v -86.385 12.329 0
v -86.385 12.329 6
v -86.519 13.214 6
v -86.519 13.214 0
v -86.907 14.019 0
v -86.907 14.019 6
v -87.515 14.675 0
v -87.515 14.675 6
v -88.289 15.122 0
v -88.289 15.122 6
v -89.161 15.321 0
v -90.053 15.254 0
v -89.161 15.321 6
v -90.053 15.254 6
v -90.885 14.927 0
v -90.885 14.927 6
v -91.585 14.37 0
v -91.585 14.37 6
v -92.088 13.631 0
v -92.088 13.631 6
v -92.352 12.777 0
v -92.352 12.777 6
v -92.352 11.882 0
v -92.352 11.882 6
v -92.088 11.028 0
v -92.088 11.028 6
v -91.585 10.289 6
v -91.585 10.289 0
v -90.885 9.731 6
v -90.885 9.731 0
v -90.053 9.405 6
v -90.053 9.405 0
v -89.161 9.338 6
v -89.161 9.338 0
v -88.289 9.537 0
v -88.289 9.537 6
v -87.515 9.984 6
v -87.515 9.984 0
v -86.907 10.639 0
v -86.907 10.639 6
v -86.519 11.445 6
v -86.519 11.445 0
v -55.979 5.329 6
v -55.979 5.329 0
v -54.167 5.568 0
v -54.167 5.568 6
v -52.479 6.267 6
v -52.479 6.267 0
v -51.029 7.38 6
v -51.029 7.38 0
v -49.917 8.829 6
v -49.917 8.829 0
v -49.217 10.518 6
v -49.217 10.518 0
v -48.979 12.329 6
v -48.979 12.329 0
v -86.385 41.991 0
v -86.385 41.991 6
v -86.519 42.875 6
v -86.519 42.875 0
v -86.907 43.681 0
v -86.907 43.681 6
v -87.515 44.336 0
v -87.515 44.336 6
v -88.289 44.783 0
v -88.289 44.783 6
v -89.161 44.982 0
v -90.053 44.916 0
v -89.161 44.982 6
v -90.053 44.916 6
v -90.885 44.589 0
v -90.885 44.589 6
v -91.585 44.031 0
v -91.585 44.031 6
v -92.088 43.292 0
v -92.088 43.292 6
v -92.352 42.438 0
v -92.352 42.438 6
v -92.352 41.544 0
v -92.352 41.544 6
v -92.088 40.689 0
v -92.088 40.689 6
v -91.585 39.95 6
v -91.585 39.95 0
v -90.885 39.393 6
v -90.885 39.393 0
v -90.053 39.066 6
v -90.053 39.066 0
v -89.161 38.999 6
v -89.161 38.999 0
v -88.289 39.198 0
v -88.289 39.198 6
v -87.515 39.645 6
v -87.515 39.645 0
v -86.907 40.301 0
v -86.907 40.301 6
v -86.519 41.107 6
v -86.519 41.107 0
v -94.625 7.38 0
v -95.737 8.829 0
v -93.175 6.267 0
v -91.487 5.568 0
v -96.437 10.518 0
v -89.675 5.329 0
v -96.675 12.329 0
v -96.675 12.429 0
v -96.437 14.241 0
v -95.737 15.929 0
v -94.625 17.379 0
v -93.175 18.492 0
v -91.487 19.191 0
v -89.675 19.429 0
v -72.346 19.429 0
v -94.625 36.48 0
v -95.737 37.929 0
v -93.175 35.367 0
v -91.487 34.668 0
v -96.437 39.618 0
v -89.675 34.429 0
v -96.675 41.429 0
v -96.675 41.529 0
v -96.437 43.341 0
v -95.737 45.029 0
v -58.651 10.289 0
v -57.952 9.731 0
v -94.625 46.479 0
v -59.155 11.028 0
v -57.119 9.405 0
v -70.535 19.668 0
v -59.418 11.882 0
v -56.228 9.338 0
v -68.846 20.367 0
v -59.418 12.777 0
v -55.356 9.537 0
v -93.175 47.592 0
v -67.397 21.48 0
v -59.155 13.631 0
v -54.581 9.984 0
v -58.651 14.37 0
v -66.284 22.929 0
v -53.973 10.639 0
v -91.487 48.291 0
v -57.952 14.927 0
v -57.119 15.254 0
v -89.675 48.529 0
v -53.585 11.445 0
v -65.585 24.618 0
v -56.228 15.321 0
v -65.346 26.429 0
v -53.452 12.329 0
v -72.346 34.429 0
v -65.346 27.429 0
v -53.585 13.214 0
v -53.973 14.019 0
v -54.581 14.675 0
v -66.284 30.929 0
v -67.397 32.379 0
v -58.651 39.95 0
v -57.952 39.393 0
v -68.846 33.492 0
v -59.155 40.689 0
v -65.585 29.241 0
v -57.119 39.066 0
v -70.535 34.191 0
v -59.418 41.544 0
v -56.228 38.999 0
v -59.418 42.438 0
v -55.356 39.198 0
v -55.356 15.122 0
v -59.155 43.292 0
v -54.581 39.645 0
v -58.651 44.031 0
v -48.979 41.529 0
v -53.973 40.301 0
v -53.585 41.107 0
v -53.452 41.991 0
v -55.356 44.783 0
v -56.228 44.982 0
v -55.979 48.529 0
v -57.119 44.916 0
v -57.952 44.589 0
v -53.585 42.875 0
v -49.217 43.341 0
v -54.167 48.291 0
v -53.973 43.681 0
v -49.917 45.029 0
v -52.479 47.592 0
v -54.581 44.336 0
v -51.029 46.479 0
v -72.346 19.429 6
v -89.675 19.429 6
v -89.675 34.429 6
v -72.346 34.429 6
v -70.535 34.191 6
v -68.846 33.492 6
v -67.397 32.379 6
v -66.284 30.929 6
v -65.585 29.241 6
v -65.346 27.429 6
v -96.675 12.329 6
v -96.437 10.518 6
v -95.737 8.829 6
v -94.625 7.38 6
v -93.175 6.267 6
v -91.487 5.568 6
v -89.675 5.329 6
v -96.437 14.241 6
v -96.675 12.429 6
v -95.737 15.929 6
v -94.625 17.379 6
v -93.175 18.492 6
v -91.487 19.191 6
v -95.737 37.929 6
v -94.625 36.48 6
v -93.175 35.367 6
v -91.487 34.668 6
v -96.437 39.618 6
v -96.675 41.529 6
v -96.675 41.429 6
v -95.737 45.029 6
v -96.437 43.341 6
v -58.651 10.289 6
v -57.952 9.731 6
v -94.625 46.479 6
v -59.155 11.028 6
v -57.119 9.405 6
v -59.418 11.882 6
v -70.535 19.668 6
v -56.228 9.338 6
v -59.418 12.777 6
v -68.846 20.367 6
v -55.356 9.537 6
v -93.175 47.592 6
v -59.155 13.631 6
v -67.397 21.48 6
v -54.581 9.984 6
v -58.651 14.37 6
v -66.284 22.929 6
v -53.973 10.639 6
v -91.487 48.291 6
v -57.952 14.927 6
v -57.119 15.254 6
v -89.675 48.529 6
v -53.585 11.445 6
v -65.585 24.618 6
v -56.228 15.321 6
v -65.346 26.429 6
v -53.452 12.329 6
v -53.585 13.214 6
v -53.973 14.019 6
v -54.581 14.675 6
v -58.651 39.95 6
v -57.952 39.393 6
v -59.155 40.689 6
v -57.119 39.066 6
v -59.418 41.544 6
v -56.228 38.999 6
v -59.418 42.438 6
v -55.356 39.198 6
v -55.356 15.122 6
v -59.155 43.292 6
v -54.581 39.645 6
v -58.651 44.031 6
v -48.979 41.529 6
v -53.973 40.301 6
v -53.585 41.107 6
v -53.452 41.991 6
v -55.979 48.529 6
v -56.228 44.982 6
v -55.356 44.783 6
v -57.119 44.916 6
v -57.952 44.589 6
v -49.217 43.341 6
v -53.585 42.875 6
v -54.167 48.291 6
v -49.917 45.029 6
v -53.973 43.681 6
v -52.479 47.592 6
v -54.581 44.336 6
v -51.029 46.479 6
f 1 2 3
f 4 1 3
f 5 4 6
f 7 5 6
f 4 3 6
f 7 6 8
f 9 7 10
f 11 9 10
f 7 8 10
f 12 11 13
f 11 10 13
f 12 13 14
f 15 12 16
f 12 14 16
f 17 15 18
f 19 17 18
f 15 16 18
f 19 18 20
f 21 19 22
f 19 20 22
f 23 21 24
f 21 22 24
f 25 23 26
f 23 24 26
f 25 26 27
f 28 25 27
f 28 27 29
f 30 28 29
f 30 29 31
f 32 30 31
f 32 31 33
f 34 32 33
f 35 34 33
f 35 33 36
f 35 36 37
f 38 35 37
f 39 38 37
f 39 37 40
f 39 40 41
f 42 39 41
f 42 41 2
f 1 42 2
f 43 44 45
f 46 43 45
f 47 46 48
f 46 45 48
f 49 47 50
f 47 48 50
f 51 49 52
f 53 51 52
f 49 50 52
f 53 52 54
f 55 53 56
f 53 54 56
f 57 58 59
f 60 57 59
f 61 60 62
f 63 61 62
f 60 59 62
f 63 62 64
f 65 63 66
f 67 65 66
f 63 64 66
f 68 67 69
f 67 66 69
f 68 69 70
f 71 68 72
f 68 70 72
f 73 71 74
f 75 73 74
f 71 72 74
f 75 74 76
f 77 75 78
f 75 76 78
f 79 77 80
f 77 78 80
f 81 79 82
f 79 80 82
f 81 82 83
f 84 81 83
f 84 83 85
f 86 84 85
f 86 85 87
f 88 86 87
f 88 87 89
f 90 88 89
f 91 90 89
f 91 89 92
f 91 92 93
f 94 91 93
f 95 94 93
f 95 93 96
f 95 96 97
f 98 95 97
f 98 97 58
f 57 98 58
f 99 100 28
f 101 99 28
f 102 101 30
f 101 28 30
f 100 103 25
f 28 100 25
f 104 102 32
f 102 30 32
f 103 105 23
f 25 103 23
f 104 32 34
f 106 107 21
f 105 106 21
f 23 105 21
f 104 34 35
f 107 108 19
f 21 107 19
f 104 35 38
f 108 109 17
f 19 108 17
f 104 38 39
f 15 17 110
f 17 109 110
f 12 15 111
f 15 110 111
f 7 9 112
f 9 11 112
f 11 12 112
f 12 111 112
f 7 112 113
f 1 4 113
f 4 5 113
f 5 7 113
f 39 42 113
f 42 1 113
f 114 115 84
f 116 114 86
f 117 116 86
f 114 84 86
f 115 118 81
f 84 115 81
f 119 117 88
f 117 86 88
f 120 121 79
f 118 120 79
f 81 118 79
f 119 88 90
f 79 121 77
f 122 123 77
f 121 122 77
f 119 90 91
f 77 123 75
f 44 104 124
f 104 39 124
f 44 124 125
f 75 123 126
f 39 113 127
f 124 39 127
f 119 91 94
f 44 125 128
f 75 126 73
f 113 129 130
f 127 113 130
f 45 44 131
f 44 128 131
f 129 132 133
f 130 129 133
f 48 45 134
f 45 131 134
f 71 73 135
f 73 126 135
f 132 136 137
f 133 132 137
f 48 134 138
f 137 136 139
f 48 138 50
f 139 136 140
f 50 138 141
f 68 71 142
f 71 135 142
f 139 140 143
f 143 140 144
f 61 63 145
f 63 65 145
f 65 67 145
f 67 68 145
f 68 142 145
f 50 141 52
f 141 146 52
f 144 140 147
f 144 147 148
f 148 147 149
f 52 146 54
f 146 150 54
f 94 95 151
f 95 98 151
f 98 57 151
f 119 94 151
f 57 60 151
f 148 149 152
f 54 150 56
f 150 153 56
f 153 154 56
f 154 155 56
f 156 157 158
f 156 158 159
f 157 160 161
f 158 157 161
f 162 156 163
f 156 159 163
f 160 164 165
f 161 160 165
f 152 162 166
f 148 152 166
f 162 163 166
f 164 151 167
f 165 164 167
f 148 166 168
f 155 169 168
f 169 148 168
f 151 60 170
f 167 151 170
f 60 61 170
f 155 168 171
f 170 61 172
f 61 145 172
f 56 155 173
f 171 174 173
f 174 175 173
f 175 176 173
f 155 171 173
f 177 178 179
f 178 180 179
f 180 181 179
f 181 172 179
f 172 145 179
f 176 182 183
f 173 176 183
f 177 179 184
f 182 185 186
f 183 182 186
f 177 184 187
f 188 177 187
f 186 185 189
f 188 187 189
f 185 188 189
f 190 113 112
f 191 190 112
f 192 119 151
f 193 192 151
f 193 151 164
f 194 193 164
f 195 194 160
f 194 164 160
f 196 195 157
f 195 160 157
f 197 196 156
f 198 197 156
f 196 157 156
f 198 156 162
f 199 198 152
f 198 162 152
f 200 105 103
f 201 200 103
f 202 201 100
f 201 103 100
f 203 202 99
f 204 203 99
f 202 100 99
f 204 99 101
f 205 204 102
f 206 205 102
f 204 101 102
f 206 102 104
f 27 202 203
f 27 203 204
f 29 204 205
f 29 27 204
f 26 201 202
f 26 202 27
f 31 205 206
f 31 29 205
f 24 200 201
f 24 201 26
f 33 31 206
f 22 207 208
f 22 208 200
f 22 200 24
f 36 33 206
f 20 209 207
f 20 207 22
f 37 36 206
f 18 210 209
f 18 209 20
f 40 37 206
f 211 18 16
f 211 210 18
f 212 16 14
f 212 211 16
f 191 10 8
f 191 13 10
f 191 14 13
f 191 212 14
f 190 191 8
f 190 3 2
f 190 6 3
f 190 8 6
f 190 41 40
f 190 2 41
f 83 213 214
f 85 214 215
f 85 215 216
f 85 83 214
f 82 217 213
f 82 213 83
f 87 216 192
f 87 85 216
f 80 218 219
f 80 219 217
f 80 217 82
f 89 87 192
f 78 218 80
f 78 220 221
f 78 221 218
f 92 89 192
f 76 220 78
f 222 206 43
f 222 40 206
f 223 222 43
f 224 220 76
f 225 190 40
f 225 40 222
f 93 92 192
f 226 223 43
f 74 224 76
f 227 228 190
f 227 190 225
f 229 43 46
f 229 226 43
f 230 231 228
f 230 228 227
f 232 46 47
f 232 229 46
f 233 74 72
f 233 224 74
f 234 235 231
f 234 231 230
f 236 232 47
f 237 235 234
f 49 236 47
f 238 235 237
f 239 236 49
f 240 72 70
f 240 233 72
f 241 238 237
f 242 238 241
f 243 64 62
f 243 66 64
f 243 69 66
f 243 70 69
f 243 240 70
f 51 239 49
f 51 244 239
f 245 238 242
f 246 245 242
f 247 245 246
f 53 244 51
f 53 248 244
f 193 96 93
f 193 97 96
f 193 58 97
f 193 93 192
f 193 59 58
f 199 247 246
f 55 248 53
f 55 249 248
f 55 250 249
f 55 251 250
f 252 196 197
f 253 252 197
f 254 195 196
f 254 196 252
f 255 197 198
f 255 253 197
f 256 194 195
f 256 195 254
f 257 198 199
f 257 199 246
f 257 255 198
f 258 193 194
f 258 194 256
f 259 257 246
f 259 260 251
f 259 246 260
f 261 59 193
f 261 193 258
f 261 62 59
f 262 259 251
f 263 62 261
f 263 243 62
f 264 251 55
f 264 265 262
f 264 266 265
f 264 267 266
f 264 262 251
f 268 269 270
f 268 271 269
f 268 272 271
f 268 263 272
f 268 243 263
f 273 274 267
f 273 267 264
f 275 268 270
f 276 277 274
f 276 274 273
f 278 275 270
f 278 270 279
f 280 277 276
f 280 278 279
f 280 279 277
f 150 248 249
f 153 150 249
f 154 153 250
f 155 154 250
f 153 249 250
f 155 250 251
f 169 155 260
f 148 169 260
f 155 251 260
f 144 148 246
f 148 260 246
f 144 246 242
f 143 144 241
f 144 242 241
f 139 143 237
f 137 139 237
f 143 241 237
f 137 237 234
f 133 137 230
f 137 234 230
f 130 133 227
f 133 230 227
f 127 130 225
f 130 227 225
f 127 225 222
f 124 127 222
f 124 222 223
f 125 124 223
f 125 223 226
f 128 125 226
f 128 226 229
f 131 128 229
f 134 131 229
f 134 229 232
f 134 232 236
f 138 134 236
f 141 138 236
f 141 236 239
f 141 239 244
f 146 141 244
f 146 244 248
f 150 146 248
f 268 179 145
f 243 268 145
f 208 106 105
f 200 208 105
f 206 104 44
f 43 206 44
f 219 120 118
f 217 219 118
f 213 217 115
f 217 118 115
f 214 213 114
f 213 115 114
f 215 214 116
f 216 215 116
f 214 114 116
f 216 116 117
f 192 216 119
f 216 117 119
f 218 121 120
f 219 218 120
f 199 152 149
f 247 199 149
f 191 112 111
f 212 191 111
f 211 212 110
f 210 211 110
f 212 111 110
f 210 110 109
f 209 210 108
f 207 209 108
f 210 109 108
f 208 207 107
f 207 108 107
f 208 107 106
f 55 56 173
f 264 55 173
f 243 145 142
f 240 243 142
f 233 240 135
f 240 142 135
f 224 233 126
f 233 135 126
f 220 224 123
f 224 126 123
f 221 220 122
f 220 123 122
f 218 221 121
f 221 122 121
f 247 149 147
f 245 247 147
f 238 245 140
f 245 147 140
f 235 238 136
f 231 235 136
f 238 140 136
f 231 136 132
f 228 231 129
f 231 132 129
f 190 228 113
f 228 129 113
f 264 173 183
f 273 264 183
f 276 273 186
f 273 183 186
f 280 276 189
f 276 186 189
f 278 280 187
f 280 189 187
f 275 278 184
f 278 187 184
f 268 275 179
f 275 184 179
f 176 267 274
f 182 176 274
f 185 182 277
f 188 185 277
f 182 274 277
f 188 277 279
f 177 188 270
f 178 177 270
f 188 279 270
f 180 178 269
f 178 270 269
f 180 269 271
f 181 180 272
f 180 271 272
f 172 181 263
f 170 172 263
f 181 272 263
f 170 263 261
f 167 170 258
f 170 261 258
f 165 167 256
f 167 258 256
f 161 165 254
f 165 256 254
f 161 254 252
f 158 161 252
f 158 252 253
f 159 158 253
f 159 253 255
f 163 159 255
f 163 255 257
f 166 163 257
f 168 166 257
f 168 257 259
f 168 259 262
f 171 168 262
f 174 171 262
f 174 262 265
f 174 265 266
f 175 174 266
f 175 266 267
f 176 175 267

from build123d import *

# Parameters (mm, degrees)
BOSS_EXTRUDE1_DEPTH = 6
SKETCH2_R           = 3
CUT_EXTRUDE1_DEPTH  = 10


with BuildPart() as part:
    # Sketch1 → Boss-Extrude1 (new body)
    with BuildSketch(Plane.XY):
        with BuildLine():
            Line((-96.675181291, 41.529422732), (-96.675181291, 41.429422732))
            ThreePointArc((-96.675181291, 41.429422732), (-94.62492876, 36.479675264), (-89.675181291, 34.429422732))
            Line((-89.675181291, 34.429422732), (-72.346473379, 34.429422732))
            ThreePointArc((-72.346473379, 34.429422732), (-67.396725911, 32.379170201), (-65.346473379, 27.429422732))
            Line((-65.346473379, 27.429422732), (-65.346473379, 26.429422732))
            ThreePointArc((-65.346473379, 26.429422732), (-67.396725911, 21.479675264), (-72.346473379, 19.429422732))
            Line((-72.346473379, 19.429422732), (-89.675181291, 19.429422732))
            ThreePointArc((-89.675181291, 19.429422732), (-94.62492876, 17.379170201), (-96.675181291, 12.429422732))
            Line((-96.675181291, 12.429422732), (-96.675181291, 12.329422732))
            ThreePointArc((-96.675181291, 12.329422732), (-94.62492876, 7.379675264), (-89.675181291, 5.329422732))
            Line((-89.675181291, 5.329422732), (-55.978821898, 5.329422732))
            ThreePointArc((-55.978821898, 5.329422732), (-51.02907443, 7.379675264), (-48.978821898, 12.329422732))
            Line((-48.978821898, 12.329422732), (-48.978821898, 41.529422732))
            ThreePointArc((-48.978821898, 41.529422732), (-51.02907443, 46.479170201), (-55.978821898, 48.529422732))
            Line((-55.978821898, 48.529422732), (-89.675181291, 48.529422732))
            ThreePointArc((-89.675181291, 48.529422732), (-94.62492876, 46.479170201), (-96.675181291, 41.529422732))
        make_face()
    extrude(amount=BOSS_EXTRUDE1_DEPTH)

    # Sketch2 → Cut-Extrude1 (cut)
    with BuildSketch(Plane.XY.offset(6)):
        with Locations((-89.385397691, 41.99084206)):
            Circle(SKETCH2_R)
        with Locations((-56.451908776, 41.99084206)):
            Circle(SKETCH2_R)
        with Locations((-56.451908776, 12.329422732)):
            Circle(SKETCH2_R)
        with Locations((-89.385397691, 12.329422732)):
            Circle(SKETCH2_R)
    extrude(amount=-CUT_EXTRUDE1_DEPTH, mode=Mode.SUBTRACT)


solid = part.part
